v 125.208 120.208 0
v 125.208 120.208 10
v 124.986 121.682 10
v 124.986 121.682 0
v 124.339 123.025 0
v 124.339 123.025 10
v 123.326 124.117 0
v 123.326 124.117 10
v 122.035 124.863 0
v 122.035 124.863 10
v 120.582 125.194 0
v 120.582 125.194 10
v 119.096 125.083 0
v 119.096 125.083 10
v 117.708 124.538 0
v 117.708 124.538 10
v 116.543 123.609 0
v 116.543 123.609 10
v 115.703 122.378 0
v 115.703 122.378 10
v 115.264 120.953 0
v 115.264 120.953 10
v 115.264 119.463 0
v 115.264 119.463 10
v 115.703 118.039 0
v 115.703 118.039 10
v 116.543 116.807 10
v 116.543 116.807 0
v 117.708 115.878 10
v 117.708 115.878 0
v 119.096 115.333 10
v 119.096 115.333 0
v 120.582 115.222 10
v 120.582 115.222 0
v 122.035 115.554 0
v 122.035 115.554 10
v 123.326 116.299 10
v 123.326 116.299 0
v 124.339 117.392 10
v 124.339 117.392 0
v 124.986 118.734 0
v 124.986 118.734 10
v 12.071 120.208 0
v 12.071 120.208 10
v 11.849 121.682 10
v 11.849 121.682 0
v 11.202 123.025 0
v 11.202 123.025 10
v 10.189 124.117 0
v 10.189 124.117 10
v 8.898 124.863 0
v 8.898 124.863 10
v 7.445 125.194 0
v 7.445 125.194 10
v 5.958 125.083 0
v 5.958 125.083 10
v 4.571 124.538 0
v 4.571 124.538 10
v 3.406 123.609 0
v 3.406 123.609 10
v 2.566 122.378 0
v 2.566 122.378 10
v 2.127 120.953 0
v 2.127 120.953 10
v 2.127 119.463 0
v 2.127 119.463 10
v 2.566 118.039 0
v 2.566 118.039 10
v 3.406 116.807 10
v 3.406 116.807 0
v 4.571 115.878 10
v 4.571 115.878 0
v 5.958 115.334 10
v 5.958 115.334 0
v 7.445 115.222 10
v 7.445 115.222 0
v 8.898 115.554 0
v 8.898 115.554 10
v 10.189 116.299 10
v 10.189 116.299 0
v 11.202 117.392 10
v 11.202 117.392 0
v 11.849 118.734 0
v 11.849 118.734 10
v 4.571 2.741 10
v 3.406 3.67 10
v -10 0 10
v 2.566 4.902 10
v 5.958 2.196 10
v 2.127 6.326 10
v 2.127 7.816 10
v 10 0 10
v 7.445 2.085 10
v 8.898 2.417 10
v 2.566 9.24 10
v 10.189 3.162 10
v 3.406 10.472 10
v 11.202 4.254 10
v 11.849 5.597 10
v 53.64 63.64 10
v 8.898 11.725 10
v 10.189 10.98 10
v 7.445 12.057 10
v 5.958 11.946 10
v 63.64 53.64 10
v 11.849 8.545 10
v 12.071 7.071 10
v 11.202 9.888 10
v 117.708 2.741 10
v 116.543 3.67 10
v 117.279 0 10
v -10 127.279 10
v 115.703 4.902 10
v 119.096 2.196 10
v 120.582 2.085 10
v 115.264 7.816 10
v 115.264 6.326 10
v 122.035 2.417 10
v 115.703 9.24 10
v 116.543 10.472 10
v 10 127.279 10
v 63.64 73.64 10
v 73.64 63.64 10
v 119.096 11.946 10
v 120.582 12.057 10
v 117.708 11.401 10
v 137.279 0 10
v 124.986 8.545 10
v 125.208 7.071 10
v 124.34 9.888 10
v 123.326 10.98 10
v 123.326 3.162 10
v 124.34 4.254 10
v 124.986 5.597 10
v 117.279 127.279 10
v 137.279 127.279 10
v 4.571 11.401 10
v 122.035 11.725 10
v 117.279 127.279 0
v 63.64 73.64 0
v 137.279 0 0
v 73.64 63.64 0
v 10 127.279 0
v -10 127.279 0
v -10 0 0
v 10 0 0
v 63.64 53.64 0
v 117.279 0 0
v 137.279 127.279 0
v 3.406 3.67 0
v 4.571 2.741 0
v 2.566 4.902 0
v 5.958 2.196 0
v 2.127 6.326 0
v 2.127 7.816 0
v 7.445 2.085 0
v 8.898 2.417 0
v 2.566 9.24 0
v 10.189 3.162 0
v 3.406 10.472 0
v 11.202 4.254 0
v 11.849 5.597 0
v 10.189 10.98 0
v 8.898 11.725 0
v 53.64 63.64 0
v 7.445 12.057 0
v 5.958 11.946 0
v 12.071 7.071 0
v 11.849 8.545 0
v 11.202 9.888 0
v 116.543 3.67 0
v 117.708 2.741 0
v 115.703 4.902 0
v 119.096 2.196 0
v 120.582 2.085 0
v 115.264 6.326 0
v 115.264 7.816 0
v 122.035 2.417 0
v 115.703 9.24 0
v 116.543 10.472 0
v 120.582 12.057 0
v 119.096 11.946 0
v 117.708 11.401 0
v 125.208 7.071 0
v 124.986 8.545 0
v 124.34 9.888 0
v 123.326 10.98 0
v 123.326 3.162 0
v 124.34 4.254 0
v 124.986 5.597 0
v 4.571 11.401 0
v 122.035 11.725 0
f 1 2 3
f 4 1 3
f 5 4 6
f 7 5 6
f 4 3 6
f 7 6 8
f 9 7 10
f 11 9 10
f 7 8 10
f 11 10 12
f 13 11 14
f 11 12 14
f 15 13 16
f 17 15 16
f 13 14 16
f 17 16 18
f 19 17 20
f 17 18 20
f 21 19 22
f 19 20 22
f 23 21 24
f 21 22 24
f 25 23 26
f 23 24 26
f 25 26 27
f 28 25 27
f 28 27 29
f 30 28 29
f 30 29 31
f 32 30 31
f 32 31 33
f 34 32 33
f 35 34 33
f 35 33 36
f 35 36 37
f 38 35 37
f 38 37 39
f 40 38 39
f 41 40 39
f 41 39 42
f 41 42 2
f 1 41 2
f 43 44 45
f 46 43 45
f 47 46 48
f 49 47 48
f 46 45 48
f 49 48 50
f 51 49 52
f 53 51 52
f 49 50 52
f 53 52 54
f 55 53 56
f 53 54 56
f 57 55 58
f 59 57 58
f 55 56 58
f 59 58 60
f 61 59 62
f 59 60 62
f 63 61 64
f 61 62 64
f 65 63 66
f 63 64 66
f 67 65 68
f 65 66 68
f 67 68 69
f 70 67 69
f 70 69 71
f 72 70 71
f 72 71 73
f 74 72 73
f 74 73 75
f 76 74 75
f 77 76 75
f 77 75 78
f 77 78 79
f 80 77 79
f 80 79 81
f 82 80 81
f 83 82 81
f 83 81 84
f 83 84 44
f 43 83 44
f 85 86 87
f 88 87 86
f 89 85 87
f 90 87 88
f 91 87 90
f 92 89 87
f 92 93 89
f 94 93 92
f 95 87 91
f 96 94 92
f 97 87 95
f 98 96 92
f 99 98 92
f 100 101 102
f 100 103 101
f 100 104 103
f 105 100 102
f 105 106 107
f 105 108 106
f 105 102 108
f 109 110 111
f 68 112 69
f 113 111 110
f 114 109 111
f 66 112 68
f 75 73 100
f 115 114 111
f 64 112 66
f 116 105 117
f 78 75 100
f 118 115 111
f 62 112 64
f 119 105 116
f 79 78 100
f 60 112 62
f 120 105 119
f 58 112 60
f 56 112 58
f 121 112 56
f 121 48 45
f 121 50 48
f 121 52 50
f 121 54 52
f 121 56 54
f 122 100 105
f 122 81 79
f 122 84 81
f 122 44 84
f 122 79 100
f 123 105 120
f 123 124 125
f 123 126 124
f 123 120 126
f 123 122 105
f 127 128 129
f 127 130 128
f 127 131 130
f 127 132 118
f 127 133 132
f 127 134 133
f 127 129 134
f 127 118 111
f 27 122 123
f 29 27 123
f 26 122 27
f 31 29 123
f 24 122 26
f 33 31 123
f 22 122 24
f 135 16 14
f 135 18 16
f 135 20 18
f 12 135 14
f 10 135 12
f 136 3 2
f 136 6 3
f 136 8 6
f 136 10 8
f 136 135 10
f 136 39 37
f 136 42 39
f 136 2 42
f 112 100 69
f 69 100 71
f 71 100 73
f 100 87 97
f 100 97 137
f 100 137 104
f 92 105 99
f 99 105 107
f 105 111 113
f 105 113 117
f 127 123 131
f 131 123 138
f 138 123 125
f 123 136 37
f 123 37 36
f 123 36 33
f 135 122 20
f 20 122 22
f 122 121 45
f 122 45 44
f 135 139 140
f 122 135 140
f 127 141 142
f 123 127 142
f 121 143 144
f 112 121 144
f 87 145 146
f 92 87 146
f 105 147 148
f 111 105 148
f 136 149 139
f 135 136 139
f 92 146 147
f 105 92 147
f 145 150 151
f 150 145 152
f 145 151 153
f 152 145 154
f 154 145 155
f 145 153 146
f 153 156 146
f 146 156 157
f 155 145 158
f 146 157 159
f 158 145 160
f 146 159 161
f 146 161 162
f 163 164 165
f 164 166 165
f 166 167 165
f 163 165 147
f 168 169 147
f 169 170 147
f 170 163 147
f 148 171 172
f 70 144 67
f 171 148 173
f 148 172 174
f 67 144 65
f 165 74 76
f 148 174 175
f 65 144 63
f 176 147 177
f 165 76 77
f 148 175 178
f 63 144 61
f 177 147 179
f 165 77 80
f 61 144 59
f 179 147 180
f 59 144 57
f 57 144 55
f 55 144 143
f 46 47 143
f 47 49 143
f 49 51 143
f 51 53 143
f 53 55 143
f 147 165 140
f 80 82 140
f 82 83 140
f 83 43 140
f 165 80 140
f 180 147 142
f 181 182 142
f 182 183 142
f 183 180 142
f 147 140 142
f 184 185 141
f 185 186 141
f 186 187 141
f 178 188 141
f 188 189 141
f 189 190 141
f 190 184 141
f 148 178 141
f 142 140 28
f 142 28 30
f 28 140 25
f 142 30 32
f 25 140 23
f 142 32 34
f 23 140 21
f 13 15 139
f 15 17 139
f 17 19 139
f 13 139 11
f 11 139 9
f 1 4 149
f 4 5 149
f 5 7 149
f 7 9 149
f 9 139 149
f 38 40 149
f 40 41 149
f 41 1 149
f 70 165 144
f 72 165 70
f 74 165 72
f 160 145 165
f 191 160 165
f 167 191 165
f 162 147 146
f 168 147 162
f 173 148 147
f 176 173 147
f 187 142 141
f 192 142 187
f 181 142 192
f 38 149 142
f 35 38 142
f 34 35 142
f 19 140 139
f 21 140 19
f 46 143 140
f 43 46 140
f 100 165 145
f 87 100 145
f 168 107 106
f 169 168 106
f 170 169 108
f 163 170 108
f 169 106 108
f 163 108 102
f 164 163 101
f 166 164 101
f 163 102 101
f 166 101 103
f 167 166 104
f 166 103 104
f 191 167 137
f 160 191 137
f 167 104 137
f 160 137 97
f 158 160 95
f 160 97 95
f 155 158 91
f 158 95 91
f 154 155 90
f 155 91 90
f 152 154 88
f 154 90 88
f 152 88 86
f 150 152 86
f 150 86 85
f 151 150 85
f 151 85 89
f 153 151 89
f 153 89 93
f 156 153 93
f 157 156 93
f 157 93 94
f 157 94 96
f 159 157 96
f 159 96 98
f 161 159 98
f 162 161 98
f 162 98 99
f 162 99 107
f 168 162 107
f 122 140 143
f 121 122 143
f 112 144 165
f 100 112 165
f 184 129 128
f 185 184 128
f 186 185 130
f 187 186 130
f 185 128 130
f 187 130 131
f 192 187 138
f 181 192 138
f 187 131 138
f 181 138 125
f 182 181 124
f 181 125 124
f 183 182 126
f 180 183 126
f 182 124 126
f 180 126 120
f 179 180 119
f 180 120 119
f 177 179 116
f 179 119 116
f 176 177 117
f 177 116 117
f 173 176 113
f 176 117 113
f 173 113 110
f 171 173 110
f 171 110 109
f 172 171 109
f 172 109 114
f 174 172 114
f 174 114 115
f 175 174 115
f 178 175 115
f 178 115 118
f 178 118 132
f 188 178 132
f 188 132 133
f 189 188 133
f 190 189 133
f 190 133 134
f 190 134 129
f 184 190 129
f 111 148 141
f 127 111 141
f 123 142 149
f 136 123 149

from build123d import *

# Parameters (mm, degrees)
F1_DEPTH = 10
F2_R     = 5
F2_R_2   = 5.0000678119
F3_DEPTH = 25


with BuildPart() as f1:
    # F0 (on Top) → F1 (new body)
    with BuildSketch(Plane.XY):
        Polygon((10, 127.279220223), (-10, 127.279220223), (53.6396103068, 63.6396103068), (63.6396102761, 73.6396102761), align=None)
        Polygon((63.6396102761, 73.6396102761), (53.6396103068, 63.6396103068), (63.6396103375, 53.6396103375), (73.6396103068, 63.6396103068), align=None)
        Polygon((117.2792206136, 127.2792206136), (63.6396102761, 73.6396102761), (73.6396103068, 63.6396103068), (137.2792206136, 127.2792206136), align=None)
        Polygon((73.6396103068, 63.6396103068), (63.6396103375, 53.6396103375), (117.2792210042, 0), (137.2792210042, 0), align=None)
        Polygon((63.6396103375, 53.6396103375), (53.6396103068, 63.6396103068), (-10, 0), (10, 0), align=None)
    extrude(amount=F1_DEPTH)

    # F2 (on face) → F3 (cut)
    with BuildSketch(Plane.XY.offset(10)):
        with Locations((7.0710959132, 120.208220223)):
            Circle(F2_R)
        with Locations((120.2081528017, 120.2081528017)):
            Circle(F2_R_2)
        with Locations((120.2083168306, 7.071)):
            Circle(F2_R)
        with Locations((7.0710959005, 7.071)):
            Circle(F2_R)
    extrude(amount=-F3_DEPTH, mode=Mode.SUBTRACT)


solid = f1.part
